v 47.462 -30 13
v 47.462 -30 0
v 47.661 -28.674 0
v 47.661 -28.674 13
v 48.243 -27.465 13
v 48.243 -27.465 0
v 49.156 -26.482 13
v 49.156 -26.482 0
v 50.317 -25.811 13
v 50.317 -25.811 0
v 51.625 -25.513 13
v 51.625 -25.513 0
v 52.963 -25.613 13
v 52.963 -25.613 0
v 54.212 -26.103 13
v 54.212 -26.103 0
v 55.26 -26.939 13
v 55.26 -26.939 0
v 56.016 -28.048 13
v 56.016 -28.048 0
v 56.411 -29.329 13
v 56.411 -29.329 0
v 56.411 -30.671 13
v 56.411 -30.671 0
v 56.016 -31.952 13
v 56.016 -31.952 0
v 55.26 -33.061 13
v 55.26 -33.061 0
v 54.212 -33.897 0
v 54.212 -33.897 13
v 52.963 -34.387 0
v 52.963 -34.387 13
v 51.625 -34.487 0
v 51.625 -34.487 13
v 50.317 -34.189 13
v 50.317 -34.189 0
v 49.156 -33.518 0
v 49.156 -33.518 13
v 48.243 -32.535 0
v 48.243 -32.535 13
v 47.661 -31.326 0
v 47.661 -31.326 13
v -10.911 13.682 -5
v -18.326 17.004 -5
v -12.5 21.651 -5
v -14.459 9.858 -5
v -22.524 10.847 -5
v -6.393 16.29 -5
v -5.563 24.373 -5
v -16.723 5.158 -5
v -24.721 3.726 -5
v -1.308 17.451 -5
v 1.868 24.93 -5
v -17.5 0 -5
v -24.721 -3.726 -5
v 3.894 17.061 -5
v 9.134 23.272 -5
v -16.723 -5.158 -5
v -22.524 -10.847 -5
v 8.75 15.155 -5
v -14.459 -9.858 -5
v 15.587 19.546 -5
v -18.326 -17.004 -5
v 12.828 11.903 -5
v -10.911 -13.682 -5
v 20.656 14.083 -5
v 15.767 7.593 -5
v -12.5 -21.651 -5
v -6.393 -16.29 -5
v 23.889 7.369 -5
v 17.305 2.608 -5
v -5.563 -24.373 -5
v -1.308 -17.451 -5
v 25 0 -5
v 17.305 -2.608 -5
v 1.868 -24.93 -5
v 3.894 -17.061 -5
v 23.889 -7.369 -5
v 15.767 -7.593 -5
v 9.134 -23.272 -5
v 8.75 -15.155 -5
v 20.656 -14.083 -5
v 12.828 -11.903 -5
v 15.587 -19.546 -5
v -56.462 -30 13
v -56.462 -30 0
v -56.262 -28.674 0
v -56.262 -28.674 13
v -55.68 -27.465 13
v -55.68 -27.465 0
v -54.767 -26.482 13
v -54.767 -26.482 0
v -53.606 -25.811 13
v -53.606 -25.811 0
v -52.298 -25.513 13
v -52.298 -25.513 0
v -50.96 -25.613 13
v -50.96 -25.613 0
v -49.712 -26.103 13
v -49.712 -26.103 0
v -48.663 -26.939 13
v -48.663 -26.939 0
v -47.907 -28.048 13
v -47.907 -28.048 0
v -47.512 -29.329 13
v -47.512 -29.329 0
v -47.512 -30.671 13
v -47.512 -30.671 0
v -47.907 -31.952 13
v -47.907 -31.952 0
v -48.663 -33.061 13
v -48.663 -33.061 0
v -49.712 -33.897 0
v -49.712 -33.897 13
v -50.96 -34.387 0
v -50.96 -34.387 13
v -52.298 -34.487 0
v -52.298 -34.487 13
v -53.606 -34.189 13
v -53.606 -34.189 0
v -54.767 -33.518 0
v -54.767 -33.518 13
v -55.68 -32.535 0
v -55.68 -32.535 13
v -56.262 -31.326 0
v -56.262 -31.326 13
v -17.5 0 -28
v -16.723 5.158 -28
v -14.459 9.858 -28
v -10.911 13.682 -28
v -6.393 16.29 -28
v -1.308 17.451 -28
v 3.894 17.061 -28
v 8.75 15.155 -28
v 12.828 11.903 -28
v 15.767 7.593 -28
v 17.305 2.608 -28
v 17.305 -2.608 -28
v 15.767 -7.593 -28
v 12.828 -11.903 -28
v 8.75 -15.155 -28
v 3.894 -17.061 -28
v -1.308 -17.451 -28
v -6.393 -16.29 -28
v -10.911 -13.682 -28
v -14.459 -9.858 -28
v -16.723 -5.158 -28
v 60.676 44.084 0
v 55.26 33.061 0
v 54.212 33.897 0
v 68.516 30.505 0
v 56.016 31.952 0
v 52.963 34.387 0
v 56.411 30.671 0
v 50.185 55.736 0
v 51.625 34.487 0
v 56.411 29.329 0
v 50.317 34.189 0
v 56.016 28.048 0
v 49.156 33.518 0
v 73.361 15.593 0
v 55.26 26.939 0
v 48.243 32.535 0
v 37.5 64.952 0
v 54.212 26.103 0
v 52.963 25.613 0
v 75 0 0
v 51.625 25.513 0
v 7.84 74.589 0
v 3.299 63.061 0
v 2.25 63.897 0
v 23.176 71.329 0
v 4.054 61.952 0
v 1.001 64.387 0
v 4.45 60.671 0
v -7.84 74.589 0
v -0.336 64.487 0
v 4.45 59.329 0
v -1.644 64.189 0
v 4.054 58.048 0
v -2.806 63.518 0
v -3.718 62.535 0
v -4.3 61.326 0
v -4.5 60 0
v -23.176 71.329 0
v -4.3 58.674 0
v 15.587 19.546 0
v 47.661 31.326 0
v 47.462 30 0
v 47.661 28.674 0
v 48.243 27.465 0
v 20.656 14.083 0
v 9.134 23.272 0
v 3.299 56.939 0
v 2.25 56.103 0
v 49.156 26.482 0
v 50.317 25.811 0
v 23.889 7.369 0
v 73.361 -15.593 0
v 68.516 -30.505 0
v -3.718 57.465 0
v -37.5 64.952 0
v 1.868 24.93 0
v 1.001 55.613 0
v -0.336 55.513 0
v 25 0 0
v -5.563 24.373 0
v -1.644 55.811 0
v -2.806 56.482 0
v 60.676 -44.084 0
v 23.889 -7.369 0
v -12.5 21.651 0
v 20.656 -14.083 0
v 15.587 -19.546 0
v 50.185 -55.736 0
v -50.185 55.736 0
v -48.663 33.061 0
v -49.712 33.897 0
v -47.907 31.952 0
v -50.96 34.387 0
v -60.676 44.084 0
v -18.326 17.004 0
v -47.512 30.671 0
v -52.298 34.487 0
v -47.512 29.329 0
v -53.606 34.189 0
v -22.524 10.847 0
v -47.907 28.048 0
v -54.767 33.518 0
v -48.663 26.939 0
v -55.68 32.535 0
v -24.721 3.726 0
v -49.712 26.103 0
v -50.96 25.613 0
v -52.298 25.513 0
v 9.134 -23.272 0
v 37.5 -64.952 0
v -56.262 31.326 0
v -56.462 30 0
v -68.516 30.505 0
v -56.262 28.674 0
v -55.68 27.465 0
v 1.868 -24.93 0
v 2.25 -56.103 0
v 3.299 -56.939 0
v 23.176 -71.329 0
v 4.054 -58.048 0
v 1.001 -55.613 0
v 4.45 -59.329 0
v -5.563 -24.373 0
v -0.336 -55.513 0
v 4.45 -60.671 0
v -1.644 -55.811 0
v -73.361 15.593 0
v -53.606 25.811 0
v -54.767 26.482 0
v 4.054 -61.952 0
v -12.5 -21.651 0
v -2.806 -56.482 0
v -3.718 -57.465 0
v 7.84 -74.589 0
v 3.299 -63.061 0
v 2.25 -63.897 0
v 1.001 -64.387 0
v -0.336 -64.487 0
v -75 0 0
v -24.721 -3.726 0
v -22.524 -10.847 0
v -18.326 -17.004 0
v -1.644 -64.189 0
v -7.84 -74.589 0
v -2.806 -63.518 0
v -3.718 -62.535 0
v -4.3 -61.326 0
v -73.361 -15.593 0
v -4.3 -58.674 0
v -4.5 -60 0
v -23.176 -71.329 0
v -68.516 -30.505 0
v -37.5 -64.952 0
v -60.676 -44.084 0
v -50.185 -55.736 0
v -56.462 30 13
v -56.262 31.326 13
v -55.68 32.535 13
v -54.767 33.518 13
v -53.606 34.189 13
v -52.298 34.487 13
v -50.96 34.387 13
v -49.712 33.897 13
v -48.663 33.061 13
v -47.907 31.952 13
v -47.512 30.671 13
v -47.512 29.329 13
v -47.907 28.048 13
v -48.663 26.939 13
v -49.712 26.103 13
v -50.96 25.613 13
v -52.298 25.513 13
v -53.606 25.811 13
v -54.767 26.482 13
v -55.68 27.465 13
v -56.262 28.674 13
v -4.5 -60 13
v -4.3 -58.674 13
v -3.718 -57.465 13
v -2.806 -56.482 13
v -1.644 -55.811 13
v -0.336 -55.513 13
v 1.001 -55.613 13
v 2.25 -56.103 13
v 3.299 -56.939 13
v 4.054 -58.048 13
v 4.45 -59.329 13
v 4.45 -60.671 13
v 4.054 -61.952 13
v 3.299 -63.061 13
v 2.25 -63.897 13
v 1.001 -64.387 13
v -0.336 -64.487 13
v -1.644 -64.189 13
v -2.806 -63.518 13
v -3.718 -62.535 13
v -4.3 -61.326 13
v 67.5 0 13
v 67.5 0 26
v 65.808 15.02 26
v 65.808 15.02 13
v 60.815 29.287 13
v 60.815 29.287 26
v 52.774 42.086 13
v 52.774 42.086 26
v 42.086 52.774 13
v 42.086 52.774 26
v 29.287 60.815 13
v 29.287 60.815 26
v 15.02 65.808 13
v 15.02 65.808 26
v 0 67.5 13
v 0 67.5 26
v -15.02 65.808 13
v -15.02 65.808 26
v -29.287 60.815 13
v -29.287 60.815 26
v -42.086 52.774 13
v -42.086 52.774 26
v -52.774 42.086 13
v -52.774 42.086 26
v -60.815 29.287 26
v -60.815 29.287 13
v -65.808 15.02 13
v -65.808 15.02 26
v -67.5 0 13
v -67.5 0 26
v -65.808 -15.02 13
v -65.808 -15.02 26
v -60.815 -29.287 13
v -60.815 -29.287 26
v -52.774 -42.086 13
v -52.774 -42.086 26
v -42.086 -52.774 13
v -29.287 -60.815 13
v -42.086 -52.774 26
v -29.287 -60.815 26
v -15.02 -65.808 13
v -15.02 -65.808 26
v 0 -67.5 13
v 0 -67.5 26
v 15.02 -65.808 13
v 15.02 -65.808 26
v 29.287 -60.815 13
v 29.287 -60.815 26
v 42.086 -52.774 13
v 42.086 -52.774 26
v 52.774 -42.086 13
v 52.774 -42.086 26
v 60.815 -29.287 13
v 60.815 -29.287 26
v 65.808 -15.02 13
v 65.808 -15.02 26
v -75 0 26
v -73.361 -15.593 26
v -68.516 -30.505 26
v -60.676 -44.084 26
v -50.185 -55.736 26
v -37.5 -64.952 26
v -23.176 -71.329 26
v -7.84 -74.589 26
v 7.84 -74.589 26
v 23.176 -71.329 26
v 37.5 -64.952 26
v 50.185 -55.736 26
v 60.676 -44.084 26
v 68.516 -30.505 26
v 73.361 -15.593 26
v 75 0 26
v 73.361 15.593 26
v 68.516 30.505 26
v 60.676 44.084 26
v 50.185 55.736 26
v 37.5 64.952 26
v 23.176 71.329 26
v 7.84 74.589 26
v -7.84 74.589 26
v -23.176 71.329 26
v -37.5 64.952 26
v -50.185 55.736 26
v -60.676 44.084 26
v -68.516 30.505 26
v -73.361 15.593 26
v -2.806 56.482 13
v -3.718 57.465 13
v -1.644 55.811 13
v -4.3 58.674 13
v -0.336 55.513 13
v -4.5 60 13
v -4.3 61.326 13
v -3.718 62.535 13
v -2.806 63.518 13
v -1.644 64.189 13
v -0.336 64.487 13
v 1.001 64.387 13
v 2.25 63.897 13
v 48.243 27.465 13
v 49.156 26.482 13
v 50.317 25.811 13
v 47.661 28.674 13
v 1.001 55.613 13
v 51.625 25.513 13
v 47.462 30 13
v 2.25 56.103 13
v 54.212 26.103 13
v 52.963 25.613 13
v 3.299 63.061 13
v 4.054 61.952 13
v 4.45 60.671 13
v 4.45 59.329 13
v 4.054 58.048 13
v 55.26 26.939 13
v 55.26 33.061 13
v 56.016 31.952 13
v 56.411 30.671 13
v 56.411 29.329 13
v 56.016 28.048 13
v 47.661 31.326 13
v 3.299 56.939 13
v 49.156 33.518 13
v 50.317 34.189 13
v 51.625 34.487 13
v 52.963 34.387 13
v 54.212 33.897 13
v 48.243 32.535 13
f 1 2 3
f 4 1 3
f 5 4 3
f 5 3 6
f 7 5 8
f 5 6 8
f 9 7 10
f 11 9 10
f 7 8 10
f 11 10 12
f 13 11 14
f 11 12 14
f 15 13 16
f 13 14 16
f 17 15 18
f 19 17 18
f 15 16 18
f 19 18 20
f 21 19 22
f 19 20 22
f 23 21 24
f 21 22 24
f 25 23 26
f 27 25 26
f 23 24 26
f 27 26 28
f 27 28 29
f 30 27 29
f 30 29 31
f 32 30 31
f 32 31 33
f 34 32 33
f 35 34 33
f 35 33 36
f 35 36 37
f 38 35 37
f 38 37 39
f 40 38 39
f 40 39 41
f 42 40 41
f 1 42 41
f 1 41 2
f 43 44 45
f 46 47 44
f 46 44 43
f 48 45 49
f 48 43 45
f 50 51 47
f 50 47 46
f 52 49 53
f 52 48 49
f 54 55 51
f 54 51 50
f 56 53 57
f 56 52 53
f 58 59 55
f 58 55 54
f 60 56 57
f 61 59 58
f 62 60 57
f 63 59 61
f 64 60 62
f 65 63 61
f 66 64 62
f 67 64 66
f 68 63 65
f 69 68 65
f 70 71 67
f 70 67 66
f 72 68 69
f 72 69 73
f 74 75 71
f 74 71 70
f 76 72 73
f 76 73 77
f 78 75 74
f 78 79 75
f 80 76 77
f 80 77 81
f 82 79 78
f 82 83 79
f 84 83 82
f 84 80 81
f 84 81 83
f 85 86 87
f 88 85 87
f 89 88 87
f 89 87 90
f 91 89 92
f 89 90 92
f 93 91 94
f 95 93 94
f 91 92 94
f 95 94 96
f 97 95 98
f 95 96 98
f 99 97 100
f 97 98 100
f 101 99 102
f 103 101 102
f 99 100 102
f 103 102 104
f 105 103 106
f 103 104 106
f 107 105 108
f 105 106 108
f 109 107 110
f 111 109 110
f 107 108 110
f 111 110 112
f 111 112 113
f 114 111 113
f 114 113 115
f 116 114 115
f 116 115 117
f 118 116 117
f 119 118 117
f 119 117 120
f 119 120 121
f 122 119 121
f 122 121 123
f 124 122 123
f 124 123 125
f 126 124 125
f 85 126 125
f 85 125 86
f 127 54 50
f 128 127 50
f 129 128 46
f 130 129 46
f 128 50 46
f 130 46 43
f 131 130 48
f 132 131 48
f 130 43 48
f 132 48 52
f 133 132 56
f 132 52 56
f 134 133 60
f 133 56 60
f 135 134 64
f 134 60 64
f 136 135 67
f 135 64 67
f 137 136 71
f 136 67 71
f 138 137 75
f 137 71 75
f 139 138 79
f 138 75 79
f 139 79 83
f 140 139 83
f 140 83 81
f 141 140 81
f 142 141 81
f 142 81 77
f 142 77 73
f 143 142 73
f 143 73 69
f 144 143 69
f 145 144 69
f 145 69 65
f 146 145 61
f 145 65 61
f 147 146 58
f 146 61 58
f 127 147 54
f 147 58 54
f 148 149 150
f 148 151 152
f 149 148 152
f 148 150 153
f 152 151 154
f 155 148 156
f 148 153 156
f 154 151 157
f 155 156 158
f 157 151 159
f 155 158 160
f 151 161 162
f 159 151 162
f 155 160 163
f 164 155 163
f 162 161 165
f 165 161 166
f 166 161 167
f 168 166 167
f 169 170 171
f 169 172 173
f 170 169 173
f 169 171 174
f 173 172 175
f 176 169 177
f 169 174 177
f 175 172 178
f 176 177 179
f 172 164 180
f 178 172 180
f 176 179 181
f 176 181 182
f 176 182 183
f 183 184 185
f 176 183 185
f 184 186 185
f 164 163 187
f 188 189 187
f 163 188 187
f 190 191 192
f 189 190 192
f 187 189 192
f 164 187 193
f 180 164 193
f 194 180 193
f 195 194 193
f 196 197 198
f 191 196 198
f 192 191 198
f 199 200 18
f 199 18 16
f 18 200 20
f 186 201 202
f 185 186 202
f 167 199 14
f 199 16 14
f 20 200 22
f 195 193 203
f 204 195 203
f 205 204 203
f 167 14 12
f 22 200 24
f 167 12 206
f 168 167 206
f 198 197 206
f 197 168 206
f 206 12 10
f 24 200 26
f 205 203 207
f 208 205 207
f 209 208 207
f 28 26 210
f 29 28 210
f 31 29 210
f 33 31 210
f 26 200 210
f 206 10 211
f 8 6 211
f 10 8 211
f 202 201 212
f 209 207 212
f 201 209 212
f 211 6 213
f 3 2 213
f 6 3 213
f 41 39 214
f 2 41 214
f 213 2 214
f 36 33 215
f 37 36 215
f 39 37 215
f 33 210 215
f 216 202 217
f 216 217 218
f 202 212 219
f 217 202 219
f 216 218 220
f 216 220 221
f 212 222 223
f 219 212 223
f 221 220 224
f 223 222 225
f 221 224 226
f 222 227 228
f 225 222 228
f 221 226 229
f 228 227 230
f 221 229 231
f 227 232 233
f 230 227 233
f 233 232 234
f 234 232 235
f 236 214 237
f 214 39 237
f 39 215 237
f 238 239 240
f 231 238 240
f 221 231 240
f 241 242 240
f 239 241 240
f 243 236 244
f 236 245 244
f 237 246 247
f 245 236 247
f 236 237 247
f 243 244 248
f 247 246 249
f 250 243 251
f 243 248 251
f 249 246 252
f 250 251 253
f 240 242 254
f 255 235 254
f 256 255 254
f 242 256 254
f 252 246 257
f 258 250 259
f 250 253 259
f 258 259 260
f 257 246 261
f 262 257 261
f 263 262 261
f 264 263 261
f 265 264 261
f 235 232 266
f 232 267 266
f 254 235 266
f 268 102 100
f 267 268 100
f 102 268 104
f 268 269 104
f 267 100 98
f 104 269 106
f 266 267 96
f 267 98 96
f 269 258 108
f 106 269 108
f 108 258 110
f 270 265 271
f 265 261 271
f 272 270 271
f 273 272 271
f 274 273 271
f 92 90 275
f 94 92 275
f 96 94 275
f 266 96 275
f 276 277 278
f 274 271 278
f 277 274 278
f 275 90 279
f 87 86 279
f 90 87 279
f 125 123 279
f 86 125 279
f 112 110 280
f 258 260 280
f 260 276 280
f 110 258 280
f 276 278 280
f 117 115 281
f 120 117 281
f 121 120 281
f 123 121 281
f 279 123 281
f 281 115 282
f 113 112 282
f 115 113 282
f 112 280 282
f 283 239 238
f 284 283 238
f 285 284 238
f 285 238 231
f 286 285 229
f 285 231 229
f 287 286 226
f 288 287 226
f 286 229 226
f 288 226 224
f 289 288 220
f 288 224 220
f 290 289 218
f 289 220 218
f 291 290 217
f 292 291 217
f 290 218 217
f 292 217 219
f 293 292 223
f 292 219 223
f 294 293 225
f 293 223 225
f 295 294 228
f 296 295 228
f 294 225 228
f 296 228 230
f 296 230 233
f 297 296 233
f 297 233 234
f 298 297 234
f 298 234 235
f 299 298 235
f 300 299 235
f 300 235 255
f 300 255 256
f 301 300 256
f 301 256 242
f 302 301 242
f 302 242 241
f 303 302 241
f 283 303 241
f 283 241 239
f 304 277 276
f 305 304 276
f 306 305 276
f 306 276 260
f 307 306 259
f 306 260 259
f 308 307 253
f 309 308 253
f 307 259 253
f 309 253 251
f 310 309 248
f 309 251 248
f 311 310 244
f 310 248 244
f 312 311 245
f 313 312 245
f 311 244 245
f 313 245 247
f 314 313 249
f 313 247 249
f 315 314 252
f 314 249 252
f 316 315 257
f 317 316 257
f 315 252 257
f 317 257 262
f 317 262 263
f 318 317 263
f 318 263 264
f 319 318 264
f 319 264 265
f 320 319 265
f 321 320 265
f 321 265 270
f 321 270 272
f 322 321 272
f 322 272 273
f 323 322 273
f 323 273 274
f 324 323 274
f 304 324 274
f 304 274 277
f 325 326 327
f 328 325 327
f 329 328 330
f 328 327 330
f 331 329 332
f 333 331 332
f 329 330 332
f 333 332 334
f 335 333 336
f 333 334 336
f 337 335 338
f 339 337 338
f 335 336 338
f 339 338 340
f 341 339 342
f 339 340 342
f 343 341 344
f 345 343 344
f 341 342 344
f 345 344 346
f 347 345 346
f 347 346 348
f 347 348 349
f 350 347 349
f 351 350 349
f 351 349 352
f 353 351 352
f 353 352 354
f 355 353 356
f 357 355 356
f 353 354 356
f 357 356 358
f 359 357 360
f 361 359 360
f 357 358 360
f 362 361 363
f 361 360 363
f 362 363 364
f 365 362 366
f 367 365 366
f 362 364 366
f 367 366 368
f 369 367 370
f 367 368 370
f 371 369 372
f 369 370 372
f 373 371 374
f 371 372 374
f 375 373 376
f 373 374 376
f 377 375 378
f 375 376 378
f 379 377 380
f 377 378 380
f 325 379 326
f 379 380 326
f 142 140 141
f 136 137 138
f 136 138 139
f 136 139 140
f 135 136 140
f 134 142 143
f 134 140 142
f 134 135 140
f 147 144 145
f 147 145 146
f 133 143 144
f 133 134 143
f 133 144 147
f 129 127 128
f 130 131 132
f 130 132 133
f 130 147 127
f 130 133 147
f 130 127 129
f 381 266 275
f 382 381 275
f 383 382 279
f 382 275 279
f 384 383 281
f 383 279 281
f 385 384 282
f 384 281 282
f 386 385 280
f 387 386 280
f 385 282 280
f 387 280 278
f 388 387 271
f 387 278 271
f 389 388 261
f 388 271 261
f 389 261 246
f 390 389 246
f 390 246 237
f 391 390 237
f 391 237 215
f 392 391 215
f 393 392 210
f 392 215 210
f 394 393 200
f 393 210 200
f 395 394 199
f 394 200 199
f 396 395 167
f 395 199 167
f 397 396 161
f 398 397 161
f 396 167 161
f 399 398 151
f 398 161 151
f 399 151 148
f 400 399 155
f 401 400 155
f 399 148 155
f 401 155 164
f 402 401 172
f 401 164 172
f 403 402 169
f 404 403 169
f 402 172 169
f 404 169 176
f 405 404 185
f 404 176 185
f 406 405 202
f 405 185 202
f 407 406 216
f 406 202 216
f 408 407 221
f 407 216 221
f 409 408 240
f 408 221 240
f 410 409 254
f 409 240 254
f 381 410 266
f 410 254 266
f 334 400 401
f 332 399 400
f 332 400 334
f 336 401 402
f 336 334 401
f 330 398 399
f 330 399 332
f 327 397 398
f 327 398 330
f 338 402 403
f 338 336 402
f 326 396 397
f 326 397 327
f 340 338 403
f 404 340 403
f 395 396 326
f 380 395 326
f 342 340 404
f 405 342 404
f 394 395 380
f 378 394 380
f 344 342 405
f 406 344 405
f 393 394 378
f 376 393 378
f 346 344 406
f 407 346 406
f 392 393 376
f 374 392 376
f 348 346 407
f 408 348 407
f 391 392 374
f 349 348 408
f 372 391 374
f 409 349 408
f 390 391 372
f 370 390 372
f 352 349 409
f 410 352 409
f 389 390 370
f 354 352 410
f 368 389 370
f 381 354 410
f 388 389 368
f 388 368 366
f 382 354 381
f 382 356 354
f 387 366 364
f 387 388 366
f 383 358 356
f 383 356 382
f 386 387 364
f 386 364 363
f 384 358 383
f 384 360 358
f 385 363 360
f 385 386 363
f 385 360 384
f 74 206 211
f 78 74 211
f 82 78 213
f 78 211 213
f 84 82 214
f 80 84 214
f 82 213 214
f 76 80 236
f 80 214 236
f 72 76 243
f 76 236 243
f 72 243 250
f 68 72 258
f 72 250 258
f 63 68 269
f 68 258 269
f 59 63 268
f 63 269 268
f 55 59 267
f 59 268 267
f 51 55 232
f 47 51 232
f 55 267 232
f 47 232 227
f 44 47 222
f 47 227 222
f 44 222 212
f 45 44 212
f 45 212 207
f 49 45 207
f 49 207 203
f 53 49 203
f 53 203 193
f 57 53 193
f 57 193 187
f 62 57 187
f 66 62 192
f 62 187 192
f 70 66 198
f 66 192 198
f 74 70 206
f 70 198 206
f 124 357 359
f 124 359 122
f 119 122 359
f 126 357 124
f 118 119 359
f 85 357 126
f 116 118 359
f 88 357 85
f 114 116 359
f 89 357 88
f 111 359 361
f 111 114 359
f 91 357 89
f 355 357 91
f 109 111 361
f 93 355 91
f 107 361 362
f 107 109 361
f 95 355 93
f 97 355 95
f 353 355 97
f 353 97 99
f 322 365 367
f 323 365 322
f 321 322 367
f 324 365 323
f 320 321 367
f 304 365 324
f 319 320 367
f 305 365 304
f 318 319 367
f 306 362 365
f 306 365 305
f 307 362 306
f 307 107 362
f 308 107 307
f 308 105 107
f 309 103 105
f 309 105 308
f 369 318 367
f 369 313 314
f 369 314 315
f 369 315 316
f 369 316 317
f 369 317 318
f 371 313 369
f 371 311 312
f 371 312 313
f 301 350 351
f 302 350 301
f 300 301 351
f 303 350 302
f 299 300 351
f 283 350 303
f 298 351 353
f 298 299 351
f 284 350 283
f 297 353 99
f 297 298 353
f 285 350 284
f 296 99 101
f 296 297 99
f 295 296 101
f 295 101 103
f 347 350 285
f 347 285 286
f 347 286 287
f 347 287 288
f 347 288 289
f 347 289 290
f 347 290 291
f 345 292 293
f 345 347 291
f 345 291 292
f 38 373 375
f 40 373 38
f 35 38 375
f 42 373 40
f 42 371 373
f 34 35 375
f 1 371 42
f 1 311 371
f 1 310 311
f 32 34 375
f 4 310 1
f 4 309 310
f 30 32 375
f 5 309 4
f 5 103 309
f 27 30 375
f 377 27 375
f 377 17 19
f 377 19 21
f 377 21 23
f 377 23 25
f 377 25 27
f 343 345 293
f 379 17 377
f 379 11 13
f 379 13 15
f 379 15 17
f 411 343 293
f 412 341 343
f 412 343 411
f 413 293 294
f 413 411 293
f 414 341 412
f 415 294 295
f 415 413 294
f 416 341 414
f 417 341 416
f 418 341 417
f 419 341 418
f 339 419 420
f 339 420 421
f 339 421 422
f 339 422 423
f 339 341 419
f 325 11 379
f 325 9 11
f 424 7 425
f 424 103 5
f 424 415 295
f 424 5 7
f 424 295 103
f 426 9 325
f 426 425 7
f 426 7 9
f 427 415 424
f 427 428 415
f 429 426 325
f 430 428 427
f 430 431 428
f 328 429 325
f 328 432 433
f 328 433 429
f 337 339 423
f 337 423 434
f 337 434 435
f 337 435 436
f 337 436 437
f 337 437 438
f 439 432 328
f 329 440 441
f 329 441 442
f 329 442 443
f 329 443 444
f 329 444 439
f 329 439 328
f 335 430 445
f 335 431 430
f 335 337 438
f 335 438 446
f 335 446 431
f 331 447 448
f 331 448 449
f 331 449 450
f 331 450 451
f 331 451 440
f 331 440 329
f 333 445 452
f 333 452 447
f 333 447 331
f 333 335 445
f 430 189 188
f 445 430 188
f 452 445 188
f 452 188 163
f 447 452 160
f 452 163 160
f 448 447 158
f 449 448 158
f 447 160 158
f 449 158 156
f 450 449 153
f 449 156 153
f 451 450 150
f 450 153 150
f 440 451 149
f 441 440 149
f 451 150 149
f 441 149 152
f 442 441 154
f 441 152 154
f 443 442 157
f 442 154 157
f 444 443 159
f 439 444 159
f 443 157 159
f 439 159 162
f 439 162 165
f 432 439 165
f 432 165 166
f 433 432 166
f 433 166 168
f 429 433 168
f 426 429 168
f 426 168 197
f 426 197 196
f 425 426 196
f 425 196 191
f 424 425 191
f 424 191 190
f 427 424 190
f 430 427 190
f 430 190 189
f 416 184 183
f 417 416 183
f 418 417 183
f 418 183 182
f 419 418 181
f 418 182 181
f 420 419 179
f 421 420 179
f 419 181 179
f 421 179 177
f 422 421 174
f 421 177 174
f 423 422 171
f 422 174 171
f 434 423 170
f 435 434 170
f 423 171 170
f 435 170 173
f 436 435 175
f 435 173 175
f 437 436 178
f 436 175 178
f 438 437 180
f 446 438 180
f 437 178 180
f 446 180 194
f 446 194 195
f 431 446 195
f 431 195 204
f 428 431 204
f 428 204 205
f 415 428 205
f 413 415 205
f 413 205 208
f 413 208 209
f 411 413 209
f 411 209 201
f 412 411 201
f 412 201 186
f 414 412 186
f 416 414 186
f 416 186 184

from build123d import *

# Parameters (mm, degrees)
SKETCH_1_R          = 75
EXTRUDE_1_DEPTH     = 26
SKETCH_3_R          = 67.5
CUT_EXTRUDE_2_DEPTH = 13
SKETCH_4_R          = 4.5
CUT_EXTRUDE_3_DEPTH = 110.206226929
SKETCH_5_R          = 25
EXTRUDE_2_DEPTH     = 5
SKETCH_8_R          = 17.5
EXTRUDE_4_DEPTH     = 23


with BuildPart() as part:
    # 草图1 → 拉伸1 (new body)
    with BuildSketch(Plane.XY):
        with Locations(Location((0, 0, 0), (0, 0, 180))):
            Circle(SKETCH_1_R)
    extrude(amount=EXTRUDE_1_DEPTH)

    # 草图3 → 切除-拉伸2 (cut)
    with BuildSketch(Plane.XY.offset(26)):
        Circle(SKETCH_3_R)
    extrude(amount=-CUT_EXTRUDE_2_DEPTH, mode=Mode.SUBTRACT)

    # 草图4 → 切除-拉伸3 (cut, through all)
    with BuildSketch(Plane(origin=(0, 0, 0), x_dir=(-1, 0, 0), z_dir=(0, 0, -1))):
        with Locations((0, 60)):
            Circle(SKETCH_4_R)
        with Locations((51.961524227, 30)):
            Circle(SKETCH_4_R)
        with Locations((51.961524227, -30)):
            Circle(SKETCH_4_R)
        with Locations((0, -60)):
            Circle(SKETCH_4_R)
        with Locations((-51.961524227, -30)):
            Circle(SKETCH_4_R)
        with Locations((-51.961524227, 30)):
            Circle(SKETCH_4_R)
    extrude(amount=-CUT_EXTRUDE_3_DEPTH, mode=Mode.SUBTRACT)

    # 草图5 → 拉伸2 (add)
    with BuildSketch(Plane(origin=(0, 0, 0), x_dir=(-1, 0, 0), z_dir=(0, 0, -1))):
        with Locations(Location((0, 0, 0), (0, 0, 180))):
            Circle(SKETCH_5_R)
    extrude(amount=EXTRUDE_2_DEPTH)

    # 草图8 → 拉伸4 (add)
    with BuildSketch(Plane(origin=(0, 0, -5), x_dir=(-1, 0, 0), z_dir=(0, 0, -1))):
        Circle(SKETCH_8_R)
    extrude(amount=EXTRUDE_4_DEPTH)


solid = part.part
